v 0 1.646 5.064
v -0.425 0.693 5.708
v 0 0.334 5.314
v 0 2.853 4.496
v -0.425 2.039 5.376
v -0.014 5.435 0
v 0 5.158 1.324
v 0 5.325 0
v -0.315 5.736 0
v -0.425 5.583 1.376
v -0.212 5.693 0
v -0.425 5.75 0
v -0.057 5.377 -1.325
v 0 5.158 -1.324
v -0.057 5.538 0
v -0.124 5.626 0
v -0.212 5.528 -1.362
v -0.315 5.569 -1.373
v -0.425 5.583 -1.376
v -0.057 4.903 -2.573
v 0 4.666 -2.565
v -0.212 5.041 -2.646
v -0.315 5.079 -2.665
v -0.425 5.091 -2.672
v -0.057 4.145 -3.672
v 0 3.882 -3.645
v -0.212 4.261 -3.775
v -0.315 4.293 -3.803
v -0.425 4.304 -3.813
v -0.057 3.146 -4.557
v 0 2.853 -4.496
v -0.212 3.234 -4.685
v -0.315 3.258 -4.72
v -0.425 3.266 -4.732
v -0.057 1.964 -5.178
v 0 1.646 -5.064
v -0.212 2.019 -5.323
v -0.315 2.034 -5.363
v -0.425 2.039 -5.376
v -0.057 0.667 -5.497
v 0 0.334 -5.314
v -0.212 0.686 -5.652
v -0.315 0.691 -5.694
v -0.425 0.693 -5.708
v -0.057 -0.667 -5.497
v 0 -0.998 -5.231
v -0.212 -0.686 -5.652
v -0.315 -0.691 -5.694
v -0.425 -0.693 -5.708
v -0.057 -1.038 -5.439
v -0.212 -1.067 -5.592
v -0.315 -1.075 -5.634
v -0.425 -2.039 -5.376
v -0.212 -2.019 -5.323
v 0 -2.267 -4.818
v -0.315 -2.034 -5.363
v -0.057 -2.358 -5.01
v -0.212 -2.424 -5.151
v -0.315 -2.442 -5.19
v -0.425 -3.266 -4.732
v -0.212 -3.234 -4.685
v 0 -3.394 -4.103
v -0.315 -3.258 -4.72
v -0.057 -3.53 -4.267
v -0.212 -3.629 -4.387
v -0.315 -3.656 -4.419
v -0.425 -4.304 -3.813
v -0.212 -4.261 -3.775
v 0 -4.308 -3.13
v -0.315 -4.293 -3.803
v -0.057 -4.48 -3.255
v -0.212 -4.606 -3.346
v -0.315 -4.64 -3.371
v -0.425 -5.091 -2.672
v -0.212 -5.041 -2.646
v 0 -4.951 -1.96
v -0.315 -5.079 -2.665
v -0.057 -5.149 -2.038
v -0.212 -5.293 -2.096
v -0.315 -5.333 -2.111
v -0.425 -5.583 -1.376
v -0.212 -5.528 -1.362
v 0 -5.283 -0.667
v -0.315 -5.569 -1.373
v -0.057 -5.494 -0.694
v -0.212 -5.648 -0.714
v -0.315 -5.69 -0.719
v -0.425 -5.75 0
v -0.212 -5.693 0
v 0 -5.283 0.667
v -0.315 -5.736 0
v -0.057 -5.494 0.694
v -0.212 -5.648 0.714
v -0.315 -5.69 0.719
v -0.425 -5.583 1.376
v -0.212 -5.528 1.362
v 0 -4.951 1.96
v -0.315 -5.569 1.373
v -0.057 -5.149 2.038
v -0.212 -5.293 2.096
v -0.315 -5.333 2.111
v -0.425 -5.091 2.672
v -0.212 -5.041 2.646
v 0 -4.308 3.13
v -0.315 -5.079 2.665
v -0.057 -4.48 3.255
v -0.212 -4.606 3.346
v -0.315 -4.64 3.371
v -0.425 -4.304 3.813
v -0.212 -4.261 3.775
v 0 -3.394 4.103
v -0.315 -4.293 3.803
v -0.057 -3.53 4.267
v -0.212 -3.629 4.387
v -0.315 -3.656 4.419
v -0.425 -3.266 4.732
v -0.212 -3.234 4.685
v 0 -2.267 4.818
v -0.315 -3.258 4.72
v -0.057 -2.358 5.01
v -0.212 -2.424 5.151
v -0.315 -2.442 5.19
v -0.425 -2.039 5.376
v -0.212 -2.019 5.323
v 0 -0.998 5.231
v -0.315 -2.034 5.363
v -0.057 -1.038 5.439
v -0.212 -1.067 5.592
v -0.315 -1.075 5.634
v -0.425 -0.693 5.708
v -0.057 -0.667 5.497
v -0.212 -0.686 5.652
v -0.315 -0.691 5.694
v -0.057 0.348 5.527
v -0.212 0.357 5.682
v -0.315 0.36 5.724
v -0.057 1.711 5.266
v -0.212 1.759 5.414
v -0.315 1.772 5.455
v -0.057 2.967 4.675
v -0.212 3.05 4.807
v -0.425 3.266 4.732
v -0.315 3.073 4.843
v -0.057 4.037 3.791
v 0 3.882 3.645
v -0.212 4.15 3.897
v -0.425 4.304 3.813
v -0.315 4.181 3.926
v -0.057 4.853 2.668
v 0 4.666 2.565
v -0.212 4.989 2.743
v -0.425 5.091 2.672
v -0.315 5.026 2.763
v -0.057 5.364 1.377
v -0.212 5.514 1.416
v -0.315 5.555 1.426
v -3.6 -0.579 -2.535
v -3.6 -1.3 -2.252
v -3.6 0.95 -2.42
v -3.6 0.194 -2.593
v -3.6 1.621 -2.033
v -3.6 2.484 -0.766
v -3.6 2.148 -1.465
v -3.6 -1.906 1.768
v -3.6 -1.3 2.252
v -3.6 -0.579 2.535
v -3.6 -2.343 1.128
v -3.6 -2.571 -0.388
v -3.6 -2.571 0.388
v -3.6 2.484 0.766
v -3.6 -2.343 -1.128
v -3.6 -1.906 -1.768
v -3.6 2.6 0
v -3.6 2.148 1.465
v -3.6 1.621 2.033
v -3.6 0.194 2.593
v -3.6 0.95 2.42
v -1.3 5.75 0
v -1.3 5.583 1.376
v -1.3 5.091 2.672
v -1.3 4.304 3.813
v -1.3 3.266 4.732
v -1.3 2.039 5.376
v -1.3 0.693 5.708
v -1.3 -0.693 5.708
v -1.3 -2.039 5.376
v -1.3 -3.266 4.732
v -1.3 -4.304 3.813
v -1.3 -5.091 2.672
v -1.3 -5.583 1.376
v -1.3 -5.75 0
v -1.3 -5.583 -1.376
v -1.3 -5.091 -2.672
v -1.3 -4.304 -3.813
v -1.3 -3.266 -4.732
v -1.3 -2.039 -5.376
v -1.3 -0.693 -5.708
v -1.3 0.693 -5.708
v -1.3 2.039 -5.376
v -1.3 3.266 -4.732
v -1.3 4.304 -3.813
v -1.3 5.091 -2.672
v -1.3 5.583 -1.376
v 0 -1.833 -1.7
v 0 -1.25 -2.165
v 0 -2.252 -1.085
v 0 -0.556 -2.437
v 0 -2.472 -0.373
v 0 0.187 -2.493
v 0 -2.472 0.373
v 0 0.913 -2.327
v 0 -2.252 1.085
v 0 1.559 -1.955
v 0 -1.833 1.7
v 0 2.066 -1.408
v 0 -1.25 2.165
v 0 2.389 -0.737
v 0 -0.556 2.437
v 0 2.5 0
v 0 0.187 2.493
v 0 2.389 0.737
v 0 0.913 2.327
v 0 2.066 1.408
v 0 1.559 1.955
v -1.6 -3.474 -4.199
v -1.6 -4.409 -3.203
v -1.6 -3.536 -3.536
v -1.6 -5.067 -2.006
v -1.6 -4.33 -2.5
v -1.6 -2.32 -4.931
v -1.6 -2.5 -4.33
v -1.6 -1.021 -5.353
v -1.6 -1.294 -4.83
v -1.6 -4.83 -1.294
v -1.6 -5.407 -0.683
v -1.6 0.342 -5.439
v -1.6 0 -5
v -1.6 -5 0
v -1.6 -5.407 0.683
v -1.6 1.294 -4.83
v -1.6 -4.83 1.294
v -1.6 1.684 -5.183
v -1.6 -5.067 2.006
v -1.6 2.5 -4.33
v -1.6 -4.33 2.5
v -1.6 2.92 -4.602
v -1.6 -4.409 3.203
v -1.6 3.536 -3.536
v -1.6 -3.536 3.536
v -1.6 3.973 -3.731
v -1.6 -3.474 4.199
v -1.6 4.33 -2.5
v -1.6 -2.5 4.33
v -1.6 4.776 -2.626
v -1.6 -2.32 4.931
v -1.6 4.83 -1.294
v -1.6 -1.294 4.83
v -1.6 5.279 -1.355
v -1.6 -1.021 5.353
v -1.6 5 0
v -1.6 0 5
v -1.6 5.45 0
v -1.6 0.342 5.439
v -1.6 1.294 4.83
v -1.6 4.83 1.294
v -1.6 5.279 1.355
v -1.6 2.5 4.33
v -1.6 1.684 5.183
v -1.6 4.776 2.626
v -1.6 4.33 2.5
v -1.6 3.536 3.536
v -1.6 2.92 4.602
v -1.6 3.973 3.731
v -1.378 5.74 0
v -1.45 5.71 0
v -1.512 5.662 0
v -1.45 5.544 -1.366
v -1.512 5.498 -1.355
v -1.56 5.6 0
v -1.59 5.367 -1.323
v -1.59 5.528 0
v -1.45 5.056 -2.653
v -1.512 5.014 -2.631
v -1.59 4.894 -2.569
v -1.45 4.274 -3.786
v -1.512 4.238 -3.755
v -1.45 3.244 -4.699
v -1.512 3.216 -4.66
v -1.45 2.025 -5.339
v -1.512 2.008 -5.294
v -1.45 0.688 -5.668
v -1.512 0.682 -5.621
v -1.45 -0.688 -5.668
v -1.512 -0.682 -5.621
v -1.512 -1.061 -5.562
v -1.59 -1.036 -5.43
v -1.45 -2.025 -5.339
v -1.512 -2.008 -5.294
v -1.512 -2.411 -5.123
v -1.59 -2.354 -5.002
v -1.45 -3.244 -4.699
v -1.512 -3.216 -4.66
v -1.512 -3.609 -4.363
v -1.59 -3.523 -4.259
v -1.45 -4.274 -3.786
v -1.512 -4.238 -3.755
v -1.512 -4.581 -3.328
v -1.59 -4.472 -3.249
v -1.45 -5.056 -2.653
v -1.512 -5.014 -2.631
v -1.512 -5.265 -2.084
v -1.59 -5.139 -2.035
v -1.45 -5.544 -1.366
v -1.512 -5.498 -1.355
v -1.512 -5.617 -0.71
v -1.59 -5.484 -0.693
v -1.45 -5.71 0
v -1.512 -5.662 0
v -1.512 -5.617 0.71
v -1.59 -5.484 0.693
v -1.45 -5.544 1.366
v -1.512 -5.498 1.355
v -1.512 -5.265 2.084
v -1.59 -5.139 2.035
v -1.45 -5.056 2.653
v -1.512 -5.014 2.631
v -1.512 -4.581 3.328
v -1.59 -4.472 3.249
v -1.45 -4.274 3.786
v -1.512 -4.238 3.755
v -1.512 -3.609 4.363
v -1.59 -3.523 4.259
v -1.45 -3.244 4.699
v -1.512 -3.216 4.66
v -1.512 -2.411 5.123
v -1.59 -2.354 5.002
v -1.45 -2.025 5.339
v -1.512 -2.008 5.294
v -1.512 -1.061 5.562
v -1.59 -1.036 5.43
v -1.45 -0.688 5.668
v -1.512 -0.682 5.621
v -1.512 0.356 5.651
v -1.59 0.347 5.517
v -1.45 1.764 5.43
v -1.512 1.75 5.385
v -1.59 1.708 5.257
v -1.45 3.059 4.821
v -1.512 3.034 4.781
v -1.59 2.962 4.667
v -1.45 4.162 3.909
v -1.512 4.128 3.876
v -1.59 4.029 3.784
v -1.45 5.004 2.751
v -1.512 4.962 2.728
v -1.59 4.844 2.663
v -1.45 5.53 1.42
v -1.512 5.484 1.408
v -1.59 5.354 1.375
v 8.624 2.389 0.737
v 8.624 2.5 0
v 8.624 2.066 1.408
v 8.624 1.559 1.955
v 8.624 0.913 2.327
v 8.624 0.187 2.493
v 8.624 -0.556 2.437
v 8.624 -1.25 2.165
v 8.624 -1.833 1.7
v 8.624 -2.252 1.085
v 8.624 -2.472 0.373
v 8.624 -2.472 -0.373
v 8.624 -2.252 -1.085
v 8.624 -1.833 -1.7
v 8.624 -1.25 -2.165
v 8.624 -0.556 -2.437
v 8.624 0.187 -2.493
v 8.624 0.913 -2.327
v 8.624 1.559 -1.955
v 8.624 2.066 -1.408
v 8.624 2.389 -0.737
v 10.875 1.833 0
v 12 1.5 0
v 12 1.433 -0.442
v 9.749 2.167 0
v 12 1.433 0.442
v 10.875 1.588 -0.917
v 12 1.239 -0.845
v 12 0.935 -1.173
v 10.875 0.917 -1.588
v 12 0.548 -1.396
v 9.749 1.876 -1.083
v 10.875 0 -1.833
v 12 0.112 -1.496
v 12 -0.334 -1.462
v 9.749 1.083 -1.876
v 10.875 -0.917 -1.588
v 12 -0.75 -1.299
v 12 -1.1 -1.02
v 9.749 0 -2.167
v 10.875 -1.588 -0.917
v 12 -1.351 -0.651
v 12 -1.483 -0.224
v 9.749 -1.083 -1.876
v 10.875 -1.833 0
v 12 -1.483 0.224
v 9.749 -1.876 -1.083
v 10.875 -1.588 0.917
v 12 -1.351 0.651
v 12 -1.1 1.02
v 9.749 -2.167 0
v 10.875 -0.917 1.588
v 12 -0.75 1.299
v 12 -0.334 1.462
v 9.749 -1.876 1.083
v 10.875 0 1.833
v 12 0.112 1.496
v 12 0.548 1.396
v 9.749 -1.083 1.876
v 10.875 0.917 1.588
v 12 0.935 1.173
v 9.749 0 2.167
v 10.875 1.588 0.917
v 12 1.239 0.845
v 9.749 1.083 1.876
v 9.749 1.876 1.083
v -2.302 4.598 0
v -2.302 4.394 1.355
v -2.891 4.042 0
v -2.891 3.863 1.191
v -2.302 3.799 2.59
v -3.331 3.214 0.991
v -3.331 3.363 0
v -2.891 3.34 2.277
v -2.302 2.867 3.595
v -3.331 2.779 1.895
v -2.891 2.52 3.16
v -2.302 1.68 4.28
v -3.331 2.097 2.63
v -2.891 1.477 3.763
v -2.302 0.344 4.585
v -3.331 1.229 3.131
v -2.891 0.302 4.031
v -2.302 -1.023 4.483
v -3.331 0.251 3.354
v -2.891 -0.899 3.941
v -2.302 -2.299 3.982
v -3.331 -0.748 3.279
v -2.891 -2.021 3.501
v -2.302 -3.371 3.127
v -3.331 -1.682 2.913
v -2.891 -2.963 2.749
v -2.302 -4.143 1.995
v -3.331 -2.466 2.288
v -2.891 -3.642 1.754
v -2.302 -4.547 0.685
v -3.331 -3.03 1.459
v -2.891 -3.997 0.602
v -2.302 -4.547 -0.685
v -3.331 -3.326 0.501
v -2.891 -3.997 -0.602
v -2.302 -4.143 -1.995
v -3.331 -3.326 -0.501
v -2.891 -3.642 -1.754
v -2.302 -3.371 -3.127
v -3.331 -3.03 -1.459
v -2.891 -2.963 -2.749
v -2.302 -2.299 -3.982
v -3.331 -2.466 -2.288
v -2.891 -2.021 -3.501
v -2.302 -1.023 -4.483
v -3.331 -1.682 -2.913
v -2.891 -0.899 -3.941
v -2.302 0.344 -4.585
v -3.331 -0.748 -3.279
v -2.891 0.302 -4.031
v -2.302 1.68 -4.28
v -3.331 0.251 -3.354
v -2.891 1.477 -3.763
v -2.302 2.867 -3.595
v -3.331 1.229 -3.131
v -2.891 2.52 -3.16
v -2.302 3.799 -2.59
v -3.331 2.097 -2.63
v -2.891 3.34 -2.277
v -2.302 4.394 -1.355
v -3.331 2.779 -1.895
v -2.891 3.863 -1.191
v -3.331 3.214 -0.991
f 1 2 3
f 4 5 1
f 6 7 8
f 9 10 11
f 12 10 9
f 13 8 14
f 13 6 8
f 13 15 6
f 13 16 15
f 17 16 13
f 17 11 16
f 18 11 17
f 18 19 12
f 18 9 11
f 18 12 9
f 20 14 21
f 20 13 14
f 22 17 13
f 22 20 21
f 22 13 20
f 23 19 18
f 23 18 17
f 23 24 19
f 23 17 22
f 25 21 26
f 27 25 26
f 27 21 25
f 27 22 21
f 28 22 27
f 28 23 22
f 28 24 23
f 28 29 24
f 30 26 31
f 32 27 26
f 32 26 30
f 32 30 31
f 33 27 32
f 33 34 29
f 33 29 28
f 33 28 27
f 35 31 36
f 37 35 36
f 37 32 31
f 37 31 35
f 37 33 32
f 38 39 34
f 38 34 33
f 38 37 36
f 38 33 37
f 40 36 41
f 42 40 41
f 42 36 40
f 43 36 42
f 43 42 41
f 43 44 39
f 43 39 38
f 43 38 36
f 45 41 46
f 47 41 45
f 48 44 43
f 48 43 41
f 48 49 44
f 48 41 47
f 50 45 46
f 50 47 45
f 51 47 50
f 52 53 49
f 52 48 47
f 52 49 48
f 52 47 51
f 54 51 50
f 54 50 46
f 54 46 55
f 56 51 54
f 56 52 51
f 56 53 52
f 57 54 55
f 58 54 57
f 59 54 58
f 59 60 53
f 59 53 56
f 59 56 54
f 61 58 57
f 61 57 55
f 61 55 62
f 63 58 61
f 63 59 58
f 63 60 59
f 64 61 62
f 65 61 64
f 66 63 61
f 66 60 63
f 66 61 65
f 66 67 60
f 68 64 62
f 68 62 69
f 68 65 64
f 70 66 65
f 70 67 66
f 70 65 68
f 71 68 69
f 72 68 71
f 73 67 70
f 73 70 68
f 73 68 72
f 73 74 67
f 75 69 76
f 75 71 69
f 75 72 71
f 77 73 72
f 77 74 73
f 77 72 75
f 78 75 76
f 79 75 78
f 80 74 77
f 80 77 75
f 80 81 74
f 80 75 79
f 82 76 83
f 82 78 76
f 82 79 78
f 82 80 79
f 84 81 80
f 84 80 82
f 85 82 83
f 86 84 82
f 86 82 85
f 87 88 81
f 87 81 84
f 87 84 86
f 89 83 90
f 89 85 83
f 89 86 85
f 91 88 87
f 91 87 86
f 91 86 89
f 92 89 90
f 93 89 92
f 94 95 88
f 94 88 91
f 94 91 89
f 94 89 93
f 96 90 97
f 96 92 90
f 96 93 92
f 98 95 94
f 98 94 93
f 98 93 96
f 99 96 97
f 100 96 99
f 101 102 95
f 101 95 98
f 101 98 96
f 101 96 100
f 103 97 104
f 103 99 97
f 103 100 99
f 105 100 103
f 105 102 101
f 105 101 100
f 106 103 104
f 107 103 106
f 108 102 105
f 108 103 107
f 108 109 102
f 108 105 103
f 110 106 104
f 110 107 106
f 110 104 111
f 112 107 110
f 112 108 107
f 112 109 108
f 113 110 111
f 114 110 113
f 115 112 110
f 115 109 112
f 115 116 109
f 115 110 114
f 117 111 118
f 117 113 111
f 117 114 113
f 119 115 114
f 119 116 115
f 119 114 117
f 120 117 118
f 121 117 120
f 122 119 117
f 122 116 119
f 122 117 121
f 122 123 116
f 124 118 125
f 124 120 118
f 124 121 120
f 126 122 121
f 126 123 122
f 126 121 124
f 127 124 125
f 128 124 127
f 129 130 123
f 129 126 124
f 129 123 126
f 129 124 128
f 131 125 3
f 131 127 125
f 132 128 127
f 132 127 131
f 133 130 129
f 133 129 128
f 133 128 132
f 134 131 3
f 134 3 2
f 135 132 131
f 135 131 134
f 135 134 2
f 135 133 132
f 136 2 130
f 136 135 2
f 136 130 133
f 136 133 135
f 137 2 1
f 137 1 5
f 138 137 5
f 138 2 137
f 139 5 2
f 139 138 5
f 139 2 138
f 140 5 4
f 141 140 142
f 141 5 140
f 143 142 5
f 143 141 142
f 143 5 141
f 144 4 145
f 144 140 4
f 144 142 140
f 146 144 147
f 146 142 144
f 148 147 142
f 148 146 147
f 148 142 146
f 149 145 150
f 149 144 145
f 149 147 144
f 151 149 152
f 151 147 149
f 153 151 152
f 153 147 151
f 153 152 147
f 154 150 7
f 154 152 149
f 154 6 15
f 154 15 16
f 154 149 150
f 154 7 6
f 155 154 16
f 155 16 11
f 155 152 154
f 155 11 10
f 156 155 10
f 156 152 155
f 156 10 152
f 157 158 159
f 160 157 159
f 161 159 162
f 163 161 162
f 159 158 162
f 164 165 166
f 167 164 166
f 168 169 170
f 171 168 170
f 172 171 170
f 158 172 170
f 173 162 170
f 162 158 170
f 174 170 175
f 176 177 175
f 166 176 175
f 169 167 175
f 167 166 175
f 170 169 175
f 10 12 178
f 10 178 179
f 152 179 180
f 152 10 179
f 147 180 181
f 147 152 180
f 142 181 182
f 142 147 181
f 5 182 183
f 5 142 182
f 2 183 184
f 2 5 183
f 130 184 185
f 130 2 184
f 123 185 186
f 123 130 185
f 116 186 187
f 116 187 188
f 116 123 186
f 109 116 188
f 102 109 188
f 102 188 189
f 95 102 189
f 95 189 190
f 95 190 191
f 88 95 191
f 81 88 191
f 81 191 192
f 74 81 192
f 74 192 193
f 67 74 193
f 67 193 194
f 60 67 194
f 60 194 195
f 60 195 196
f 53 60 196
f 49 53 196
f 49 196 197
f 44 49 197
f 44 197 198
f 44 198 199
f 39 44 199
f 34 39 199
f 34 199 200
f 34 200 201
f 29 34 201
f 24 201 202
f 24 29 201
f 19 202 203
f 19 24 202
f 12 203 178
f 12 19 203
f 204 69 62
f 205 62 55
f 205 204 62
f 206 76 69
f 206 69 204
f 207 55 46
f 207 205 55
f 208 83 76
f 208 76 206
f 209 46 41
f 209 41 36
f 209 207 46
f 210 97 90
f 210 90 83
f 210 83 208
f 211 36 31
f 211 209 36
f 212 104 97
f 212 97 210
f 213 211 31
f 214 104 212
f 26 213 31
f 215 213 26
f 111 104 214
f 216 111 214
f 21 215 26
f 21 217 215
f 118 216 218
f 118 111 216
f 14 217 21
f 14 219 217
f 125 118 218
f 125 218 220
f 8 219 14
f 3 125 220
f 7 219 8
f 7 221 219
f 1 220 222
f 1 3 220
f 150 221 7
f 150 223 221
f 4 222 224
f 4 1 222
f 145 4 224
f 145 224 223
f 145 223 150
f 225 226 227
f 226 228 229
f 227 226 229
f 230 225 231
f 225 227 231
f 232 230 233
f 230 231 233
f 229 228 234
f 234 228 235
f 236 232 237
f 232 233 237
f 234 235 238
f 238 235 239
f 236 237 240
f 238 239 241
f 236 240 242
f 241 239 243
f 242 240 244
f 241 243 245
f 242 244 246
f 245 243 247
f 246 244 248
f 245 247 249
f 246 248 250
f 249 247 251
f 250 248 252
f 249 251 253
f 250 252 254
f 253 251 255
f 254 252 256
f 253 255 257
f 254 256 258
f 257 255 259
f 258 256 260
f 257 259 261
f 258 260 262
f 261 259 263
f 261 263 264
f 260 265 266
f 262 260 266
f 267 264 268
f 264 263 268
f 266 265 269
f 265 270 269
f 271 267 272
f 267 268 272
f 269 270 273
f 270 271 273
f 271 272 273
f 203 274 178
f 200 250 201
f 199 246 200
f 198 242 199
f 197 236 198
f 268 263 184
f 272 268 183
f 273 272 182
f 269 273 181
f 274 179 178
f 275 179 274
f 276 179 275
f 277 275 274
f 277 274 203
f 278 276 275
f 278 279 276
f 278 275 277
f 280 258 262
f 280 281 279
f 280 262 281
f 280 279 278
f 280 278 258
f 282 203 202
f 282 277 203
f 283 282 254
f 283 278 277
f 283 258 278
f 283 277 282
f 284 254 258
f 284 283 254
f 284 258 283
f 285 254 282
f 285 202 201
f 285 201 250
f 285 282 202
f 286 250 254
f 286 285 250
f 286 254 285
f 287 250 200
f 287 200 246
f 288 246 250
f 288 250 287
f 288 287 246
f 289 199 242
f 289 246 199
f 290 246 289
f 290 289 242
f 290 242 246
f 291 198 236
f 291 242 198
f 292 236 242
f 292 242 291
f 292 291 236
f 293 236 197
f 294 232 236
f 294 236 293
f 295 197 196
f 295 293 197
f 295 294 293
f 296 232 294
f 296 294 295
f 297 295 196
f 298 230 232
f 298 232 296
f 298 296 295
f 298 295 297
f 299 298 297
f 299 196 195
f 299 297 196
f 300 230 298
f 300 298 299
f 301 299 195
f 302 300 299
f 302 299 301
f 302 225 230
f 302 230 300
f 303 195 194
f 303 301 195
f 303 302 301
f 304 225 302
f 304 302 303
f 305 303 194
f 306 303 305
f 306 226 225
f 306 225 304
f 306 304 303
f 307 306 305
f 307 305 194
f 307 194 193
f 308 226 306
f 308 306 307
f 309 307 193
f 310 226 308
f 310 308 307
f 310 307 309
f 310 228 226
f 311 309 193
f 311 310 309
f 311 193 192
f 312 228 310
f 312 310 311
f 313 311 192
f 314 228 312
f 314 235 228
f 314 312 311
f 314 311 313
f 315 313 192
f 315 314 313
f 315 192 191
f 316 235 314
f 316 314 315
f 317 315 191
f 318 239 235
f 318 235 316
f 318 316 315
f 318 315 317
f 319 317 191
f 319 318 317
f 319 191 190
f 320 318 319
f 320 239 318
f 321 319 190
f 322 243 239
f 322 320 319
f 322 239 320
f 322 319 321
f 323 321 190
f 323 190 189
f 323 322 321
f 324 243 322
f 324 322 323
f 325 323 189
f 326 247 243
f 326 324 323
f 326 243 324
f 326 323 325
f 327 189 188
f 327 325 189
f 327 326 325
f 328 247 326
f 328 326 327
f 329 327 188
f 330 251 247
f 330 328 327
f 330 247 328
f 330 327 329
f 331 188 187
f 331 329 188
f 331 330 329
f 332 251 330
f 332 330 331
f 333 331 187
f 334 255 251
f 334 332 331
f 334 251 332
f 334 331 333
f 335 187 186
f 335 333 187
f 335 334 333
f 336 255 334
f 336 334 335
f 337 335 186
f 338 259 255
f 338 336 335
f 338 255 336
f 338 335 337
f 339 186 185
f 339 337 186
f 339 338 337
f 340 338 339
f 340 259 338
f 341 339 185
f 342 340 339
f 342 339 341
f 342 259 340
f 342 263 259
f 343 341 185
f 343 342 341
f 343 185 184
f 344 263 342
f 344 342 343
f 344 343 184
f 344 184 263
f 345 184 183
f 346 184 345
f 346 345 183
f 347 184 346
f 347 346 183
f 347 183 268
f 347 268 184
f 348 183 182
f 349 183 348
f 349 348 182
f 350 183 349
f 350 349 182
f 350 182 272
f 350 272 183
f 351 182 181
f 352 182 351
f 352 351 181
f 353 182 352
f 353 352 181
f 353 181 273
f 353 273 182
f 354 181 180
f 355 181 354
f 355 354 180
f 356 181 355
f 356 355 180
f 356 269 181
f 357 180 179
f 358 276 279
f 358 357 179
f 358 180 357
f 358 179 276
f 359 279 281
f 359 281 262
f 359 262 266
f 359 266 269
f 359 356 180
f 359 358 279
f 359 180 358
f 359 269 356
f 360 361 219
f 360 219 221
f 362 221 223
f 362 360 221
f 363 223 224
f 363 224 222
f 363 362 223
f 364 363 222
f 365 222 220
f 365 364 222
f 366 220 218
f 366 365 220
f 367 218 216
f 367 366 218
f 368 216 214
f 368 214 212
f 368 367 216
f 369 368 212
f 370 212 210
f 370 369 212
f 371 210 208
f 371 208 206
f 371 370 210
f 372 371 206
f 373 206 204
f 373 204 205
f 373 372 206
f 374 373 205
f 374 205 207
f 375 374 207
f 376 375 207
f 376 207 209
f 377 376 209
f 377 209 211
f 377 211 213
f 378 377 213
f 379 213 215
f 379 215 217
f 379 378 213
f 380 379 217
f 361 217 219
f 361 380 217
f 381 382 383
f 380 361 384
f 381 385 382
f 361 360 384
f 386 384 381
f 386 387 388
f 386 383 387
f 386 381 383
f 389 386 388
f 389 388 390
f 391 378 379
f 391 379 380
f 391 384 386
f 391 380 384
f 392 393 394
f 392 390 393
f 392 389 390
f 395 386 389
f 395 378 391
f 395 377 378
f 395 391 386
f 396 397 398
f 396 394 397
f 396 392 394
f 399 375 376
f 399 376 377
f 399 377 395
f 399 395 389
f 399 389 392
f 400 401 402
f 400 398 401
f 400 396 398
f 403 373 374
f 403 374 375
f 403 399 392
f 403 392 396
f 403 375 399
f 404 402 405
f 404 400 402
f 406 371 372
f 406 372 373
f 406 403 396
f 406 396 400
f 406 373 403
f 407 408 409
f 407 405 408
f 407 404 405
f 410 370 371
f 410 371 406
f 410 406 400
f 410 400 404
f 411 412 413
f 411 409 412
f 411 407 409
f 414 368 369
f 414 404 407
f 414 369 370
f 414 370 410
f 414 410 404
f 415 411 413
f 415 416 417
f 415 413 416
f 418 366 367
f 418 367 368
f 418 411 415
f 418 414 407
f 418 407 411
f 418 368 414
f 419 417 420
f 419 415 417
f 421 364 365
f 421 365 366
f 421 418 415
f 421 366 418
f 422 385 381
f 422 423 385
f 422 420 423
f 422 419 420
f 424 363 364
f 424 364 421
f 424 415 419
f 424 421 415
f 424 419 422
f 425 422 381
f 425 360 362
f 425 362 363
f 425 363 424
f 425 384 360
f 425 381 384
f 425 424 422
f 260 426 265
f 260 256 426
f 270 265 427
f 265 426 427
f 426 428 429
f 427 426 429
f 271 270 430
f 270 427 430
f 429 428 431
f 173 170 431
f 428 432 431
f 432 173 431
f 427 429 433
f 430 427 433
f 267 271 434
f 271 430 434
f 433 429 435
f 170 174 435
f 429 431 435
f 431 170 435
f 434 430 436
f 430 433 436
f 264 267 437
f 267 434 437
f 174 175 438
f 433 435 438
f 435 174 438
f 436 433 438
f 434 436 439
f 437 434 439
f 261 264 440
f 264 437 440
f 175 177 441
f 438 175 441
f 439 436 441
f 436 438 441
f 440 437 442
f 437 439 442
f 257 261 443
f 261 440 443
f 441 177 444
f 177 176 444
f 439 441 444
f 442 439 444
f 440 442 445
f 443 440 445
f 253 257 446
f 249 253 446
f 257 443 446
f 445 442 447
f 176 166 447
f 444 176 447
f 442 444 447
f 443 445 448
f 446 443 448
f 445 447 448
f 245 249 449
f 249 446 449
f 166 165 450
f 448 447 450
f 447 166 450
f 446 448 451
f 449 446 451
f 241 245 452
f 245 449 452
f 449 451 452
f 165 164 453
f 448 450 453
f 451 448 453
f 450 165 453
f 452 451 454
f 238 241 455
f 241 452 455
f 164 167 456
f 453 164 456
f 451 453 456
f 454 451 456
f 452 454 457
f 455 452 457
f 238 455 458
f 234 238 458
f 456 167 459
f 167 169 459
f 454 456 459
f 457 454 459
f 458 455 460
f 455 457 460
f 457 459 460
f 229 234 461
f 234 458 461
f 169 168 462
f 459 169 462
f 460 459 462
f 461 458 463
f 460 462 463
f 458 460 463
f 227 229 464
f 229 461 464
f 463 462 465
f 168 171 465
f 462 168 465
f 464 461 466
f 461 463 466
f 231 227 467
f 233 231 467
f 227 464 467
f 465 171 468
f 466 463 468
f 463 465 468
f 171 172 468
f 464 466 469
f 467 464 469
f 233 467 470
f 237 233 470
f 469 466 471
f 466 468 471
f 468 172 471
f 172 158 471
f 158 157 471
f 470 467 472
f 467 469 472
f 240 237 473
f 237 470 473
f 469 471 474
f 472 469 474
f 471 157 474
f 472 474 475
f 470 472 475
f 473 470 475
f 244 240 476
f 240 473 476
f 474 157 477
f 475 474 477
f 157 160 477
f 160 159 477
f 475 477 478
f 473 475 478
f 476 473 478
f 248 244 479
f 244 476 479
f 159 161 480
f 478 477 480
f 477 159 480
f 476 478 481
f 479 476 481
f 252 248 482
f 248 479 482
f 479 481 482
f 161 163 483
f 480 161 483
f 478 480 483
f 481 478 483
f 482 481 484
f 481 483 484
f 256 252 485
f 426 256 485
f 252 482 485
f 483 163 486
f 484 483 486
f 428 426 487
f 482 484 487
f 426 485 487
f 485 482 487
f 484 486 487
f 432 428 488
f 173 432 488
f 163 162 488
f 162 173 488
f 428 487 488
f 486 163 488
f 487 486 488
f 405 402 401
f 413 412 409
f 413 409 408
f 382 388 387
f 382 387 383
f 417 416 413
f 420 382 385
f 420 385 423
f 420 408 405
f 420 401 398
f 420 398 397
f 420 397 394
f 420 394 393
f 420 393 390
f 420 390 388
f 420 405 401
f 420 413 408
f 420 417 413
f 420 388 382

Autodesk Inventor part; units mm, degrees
sketch "Sketch_1" plane through (0, 0, 0) normal (0, 0, 1) x (1, 0, 0)
  line L0 (12, 0) -> (-3.6, 0)
  line L1 (-3.6, 0) -> (-3.6, 2.6)
  arc A0 (-1.6, 5) -> (-3.6, 2.6) centre (-0.2671, 1.8559) ccw
  line L2 (-1.6, 5) -> (-1.6, 5.45)
  arc A1 (-1.3, 5.75) -> (-1.6, 5.45) centre (-1.3, 5.45) ccw
  line L3 (-1.3, 5.75) -> (-0.425, 5.75)
  arc A2 (0, 5.325) -> (-0.425, 5.75) centre (-0.425, 5.325) ccw
  line L4 (0, 5.325) -> (0, 2.5)
  line L5 (0, 2.5) -> (8.6241, 2.5)
  line L6 (8.6241, 2.5) -> (12, 1.5)
  line L7 (12, 1.5) -> (12, 0)
  line L8 (12, 0) -> (-3.6, 0)
revolve "Revolution1" add sketch "Sketch_1" angle 360 about axis through (12, 0, 0) along (1, 0, 0)
ref_plane "SCHRAUBE_XY" through (0, 0, 0) normal (-1, 0, 0) x (0, 0, -1)
ref_plane "SCHRAUBE_YZ" through (0, 0, 0) normal (0, 0, -1) x (0, -1, 0)
ref_plane "SCHRAUBE_ZX" through (0, 0, 0) normal (0, -1, 0) x (-1, 0, 0)
properties part number "1301.000_10_(1)"
